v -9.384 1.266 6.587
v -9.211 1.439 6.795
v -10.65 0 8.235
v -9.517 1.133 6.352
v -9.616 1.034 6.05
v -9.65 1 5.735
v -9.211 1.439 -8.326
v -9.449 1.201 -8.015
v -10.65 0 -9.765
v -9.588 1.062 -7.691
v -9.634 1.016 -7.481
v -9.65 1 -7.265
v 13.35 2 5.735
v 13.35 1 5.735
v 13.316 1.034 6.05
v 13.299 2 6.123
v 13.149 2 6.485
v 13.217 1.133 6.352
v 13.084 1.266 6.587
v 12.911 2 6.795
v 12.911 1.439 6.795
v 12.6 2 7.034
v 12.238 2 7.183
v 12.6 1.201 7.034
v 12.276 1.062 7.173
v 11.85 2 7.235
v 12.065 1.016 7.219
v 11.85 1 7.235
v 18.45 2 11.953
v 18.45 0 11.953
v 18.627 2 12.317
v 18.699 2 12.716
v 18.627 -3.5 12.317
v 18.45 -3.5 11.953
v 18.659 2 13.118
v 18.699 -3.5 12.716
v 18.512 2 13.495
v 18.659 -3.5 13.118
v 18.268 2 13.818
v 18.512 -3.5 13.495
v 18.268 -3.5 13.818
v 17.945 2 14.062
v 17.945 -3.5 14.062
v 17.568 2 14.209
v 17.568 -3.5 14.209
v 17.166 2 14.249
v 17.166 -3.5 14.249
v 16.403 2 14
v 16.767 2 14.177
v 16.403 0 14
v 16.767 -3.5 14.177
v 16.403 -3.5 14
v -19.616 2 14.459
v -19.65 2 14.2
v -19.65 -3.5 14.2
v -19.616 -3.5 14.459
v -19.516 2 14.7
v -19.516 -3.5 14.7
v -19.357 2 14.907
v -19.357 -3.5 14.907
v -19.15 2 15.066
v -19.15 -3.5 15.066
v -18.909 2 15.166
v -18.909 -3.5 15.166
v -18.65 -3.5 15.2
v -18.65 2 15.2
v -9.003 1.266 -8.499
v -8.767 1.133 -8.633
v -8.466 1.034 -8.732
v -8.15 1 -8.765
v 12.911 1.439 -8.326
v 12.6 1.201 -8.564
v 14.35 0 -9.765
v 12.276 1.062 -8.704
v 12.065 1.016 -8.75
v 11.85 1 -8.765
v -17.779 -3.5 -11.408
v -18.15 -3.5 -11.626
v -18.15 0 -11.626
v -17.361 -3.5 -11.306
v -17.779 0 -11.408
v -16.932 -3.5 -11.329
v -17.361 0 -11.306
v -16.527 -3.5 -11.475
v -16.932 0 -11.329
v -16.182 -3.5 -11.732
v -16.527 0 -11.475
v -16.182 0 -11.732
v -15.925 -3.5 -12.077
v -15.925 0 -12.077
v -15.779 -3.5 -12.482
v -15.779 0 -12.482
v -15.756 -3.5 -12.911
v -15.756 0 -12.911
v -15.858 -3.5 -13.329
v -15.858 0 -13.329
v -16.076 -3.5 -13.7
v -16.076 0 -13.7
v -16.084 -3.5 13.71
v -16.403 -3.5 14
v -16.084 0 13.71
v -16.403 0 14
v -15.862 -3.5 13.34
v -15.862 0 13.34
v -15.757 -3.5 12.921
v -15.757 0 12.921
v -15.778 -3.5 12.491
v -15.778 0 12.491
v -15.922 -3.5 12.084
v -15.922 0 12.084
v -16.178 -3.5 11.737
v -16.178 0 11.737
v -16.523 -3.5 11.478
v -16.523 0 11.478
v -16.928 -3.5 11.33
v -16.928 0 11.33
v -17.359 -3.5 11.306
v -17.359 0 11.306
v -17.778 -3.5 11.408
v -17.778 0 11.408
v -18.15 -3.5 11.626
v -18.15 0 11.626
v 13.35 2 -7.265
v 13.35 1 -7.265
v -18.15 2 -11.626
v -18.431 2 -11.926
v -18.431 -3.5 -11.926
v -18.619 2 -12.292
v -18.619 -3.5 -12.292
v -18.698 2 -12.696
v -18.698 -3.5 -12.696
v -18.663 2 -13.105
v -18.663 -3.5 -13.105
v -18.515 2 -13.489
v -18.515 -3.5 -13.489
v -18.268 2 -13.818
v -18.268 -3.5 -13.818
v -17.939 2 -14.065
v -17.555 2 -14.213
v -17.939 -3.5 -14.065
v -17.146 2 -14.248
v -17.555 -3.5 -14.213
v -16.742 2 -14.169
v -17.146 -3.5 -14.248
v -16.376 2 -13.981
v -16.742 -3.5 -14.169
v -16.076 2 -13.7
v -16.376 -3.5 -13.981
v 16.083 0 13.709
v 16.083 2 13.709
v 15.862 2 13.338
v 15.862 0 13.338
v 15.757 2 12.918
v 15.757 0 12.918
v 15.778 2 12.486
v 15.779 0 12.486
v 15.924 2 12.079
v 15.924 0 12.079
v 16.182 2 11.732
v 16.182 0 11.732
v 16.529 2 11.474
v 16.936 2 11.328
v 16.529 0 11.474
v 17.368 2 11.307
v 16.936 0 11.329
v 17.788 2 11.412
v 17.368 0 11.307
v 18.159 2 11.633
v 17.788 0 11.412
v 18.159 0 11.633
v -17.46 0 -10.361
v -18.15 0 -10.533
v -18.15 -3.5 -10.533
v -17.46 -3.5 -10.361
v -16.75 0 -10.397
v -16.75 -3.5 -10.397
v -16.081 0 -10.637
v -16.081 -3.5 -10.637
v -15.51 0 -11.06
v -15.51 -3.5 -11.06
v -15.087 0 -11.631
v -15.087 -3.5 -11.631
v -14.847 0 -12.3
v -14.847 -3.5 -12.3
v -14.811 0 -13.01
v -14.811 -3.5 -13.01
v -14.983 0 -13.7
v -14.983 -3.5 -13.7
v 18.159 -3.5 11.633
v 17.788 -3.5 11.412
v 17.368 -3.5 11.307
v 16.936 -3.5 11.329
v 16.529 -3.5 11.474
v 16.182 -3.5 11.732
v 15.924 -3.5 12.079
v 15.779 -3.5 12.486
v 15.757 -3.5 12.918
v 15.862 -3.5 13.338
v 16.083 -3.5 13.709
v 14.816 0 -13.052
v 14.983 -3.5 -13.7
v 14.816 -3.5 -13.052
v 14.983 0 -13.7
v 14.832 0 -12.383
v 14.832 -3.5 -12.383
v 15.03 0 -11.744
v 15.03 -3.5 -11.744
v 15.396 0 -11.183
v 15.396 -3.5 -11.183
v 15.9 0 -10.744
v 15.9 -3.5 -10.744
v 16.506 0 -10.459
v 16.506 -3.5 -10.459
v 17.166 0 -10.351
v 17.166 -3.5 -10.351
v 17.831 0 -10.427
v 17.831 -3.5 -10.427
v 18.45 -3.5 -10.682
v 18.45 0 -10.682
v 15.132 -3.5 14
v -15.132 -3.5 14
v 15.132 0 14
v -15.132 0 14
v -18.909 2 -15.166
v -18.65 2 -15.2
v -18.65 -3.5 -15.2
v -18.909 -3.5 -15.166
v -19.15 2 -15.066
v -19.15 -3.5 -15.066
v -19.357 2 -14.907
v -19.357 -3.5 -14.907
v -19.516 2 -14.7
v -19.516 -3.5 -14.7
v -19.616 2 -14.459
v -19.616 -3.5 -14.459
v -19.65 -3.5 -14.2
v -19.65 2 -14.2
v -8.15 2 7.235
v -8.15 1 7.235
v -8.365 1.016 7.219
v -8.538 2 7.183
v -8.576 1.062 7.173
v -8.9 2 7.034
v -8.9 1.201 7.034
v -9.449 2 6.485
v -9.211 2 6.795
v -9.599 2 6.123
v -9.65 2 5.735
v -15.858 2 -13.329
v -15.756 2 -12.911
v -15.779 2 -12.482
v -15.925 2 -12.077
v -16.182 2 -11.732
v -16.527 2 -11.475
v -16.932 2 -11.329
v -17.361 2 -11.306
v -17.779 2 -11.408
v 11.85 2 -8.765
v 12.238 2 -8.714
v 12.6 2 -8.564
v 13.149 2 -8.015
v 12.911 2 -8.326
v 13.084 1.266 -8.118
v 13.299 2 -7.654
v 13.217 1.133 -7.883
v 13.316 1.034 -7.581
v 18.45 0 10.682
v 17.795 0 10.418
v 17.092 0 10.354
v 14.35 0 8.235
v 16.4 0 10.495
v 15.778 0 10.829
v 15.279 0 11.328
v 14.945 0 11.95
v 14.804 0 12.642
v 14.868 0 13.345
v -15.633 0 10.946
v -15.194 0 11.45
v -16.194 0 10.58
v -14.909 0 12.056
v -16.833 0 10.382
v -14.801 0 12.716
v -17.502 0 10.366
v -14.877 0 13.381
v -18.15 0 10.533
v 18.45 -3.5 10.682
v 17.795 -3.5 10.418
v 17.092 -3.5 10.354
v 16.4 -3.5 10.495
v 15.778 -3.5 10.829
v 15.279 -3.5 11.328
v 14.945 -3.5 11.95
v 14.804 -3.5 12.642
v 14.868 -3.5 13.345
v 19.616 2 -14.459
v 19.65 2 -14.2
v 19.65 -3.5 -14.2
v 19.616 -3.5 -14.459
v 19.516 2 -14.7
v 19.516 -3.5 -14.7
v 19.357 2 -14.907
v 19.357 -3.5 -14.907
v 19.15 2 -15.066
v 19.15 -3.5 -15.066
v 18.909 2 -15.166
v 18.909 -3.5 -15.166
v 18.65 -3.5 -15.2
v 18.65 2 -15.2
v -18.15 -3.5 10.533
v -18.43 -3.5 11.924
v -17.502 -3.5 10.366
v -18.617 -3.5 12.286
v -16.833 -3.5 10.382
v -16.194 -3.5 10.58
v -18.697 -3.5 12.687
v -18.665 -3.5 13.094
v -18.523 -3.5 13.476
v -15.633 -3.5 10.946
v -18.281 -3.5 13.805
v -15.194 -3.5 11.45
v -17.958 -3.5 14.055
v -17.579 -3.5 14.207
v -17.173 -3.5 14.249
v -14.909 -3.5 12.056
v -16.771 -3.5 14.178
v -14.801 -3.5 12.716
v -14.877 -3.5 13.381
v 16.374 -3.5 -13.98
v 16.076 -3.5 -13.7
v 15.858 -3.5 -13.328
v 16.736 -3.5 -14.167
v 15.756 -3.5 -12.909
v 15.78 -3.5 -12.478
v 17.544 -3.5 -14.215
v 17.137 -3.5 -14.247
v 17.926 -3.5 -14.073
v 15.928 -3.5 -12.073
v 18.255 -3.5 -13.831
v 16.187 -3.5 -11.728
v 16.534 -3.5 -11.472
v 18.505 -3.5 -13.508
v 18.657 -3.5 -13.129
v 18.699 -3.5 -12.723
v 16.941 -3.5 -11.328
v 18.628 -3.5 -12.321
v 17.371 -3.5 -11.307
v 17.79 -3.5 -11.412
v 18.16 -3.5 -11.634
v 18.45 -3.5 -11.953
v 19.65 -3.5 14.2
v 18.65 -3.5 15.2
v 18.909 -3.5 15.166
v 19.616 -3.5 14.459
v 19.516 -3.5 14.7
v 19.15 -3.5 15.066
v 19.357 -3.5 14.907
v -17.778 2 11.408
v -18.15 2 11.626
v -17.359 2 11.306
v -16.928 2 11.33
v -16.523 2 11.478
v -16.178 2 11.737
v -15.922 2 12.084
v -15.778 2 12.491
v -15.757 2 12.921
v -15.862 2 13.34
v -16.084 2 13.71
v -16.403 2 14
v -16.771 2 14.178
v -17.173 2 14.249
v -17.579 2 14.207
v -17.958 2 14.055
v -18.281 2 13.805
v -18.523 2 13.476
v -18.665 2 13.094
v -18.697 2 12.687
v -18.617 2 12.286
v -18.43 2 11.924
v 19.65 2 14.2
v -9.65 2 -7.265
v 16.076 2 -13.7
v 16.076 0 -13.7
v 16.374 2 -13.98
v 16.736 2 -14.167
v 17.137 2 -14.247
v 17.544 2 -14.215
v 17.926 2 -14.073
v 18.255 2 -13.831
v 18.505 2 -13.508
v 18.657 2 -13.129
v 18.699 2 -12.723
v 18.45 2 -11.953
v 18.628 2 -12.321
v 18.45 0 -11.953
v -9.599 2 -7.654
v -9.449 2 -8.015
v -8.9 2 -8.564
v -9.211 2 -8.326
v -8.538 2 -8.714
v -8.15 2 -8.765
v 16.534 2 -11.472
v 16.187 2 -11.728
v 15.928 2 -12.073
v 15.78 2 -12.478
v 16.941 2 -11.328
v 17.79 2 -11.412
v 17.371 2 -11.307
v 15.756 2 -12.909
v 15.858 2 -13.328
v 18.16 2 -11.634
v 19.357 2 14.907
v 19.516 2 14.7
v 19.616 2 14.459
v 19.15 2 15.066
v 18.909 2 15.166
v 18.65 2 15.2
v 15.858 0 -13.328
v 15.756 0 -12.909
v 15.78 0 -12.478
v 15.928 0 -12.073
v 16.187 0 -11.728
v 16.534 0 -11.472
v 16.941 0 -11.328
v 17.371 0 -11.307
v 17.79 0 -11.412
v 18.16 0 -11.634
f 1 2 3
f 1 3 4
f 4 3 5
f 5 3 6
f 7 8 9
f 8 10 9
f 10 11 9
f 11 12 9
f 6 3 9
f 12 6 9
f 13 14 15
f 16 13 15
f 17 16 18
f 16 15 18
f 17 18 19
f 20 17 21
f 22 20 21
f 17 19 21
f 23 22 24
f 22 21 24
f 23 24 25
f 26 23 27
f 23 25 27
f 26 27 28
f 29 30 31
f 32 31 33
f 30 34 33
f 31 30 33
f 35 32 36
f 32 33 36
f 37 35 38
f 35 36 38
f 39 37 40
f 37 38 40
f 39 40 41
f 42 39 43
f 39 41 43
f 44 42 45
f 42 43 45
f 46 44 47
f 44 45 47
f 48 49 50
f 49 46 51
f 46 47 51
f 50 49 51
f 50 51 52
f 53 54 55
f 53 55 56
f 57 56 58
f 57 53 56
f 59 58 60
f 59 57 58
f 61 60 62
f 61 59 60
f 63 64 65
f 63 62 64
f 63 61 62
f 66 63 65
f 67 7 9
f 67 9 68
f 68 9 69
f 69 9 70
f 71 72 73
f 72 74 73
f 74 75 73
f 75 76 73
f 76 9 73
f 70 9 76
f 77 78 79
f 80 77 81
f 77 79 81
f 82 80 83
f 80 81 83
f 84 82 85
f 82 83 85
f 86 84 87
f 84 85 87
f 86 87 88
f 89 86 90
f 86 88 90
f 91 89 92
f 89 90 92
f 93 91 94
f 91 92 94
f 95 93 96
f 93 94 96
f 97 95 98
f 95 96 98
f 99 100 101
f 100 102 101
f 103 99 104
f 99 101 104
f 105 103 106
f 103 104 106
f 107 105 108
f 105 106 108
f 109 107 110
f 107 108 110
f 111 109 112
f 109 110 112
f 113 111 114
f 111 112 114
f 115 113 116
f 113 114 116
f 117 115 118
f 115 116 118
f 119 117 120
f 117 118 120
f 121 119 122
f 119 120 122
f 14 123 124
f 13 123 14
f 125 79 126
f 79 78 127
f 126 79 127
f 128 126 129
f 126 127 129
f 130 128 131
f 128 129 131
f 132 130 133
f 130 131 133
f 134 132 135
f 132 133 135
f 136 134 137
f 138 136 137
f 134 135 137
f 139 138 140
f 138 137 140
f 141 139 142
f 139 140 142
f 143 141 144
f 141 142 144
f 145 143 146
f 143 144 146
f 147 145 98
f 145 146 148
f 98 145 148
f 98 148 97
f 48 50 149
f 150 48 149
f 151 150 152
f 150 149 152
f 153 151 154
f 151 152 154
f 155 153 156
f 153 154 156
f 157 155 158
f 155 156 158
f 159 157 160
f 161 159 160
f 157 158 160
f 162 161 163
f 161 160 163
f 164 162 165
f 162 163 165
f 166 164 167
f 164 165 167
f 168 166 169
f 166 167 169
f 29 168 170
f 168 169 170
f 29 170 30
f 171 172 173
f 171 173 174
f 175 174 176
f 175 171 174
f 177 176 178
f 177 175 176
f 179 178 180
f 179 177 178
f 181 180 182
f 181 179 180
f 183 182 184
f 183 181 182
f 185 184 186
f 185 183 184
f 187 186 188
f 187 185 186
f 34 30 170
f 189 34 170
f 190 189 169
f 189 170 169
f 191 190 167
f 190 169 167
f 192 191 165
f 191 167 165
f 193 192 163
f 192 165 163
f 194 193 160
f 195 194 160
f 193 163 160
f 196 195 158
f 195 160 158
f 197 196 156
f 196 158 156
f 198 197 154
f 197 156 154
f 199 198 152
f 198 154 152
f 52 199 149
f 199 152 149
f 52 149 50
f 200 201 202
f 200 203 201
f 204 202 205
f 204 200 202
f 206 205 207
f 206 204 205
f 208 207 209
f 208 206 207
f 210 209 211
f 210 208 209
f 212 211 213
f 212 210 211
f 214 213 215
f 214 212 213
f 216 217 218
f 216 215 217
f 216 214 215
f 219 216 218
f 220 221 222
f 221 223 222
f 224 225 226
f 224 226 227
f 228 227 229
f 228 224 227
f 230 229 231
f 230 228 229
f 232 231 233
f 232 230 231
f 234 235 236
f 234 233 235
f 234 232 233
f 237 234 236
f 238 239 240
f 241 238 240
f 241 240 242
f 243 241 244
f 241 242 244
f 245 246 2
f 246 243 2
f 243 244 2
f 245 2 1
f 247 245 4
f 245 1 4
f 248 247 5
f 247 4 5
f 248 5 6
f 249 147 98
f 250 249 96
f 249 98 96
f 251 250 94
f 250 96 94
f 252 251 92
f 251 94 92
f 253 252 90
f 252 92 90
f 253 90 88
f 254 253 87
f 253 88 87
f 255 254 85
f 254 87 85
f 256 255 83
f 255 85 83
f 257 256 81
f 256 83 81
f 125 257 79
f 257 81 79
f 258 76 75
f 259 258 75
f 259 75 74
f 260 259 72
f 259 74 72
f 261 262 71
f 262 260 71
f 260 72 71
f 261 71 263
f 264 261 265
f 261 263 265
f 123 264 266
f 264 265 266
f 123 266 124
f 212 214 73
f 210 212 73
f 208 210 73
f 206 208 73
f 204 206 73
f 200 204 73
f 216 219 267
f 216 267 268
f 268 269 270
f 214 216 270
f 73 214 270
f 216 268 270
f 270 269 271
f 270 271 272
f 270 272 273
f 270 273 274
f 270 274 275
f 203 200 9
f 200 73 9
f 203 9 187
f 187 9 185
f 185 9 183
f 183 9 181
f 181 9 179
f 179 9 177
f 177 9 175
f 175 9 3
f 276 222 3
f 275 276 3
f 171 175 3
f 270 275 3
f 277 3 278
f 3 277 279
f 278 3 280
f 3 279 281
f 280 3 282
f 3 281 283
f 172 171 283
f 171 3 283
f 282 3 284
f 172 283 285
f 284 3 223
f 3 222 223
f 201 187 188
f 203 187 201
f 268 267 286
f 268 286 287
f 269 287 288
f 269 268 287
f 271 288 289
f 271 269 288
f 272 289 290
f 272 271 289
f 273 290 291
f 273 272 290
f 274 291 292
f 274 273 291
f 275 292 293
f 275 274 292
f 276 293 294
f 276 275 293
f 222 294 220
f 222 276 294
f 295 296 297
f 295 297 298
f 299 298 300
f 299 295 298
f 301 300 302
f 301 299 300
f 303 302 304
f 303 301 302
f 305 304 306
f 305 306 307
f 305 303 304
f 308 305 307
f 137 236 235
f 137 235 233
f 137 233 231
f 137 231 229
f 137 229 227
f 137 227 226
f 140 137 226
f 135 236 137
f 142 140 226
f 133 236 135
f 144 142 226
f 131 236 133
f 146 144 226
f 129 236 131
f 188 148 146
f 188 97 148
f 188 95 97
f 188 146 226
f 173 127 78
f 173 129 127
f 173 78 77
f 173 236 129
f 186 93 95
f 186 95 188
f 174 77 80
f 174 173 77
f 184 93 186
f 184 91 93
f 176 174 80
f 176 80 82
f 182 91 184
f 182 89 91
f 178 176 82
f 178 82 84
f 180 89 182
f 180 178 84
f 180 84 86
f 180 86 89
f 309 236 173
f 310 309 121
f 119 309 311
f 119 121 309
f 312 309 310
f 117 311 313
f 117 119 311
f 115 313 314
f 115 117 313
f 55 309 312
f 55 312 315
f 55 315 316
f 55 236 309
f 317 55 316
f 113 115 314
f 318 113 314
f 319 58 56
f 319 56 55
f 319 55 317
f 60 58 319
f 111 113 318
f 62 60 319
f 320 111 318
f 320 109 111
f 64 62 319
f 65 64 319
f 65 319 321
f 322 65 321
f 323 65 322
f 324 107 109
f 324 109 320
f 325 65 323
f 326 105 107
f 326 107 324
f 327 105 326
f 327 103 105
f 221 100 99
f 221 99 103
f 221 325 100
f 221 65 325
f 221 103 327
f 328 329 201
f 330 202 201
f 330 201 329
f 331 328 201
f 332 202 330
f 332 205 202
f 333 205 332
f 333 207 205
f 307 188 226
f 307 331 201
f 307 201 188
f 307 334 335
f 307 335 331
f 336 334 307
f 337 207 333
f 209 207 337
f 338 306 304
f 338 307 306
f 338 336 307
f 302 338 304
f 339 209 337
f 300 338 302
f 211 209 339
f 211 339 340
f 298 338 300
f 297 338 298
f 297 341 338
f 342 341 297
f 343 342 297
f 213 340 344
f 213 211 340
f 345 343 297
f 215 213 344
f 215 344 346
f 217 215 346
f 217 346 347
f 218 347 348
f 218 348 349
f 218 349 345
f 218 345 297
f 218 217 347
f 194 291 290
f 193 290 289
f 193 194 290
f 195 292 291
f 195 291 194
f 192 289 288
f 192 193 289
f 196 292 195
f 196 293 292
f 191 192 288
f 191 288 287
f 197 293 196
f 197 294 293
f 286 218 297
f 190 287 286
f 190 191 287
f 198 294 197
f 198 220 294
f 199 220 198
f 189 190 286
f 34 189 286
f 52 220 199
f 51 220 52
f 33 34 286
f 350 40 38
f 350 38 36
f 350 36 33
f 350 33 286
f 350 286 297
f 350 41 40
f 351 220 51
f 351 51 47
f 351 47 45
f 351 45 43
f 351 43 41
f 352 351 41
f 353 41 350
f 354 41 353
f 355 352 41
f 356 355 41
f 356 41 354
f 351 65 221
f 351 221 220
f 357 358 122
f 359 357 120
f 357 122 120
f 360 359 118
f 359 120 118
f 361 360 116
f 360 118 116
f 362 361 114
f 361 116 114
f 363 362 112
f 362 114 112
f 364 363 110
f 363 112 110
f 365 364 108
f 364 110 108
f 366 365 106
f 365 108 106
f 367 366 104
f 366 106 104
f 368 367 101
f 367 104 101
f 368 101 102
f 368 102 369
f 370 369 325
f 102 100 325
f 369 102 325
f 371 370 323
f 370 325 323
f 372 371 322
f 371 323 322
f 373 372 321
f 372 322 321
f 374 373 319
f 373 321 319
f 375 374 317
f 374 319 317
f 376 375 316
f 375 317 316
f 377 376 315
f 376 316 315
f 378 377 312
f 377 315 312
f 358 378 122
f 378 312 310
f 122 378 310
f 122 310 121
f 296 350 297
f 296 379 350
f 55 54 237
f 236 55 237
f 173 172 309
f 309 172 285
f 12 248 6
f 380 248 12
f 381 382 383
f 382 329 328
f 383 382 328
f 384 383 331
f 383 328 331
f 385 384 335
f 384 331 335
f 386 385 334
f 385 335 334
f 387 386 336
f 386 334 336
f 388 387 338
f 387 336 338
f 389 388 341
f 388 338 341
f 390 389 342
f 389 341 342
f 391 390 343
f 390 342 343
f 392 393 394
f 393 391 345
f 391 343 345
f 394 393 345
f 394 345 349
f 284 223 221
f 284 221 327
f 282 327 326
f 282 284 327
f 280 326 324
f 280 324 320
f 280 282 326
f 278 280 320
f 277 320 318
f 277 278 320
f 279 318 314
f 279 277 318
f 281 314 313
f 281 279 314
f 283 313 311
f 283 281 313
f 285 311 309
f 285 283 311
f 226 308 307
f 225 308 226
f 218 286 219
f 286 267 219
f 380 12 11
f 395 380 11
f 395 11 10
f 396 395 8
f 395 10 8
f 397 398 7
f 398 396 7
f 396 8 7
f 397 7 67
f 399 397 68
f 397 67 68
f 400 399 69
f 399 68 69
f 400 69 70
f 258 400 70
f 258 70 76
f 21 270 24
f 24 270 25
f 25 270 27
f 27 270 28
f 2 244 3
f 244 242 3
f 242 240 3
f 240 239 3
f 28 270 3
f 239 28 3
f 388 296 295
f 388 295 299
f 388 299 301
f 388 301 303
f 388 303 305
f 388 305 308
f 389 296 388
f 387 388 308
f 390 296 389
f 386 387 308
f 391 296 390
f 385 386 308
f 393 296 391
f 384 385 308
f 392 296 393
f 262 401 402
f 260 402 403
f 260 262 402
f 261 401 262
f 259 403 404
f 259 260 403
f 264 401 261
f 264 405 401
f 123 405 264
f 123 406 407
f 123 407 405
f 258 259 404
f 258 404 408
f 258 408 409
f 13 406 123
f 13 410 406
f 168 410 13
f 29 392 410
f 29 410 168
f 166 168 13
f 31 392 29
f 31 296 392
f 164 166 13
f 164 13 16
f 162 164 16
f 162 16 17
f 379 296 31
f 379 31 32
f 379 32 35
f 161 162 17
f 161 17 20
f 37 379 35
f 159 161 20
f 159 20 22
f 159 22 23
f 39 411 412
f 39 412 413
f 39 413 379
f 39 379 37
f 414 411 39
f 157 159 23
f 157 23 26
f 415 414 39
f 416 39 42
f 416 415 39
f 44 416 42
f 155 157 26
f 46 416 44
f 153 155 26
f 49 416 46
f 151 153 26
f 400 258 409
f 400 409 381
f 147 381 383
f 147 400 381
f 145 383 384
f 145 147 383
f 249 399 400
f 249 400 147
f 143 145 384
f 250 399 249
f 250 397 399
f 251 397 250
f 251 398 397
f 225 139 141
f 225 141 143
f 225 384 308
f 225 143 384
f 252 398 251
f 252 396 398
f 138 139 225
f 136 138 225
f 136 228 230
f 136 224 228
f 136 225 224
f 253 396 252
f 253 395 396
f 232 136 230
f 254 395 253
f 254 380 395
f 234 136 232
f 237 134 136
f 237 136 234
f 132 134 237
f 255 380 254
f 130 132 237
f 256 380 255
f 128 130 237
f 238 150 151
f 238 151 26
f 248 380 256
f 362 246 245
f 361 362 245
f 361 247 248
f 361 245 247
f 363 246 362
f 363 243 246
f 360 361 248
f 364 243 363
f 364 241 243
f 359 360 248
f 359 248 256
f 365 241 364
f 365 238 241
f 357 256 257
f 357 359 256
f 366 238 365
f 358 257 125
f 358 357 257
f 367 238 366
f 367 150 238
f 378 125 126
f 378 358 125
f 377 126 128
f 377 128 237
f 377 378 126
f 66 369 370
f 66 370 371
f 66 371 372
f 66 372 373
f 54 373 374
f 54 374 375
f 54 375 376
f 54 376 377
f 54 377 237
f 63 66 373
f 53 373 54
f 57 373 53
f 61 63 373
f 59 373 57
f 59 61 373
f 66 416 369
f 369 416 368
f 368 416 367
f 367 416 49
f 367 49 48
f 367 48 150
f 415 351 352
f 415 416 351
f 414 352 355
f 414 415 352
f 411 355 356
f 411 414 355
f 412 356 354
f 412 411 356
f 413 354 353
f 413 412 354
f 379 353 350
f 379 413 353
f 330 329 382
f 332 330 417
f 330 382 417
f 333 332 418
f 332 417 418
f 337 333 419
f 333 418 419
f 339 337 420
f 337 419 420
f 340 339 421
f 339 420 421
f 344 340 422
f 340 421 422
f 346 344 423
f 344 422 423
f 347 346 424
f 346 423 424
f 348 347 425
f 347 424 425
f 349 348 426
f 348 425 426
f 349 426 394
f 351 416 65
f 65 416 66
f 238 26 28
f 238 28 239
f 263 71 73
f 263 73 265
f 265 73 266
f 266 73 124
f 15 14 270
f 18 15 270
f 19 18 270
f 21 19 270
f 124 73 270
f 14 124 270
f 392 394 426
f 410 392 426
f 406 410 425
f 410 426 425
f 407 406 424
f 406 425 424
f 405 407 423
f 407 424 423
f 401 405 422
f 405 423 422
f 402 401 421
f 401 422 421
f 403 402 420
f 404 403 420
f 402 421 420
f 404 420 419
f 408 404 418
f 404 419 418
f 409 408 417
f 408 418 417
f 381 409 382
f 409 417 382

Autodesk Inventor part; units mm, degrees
ref_plane "YZ Plane" through (0, 0, 0) normal (1, 0, 0) x (0, 1, 0)
ref_plane "XZ Plane" through (0, 0, 0) normal (0, 1, 0) x (-1, 0, 0)
ref_plane "XY Plane" through (0, 0, 0) normal (0, 0, 1) x (1, 0, 0)
sketch "Sketch1" plane through (0, 0, 0) normal (0, 1, 0) x (-1, 0, 0)
  line L0 (-19.65, 15.2) -> (19.65, 15.2)
  line L1 (19.65, 15.2) -> (19.65, -15.2)
  line L2 (19.65, -15.2) -> (-19.65, -15.2)
  line L3 (-19.65, -15.2) -> (-19.65, 15.2)
  line L4 (-19.65, 15.2) -> (19.65, -15.2) construction
  line L5 (19.65, 15.2) -> (-19.65, -15.2) construction
  point P0 (0, 0)
  dimension "d0" = 30.4
  dimension "d1" = 39.3
extrude "Extrusion1" add sketch "Sketch1" along normal blind 2
sketch "Sketch2" plane through (0, 0, 0) normal (0, -1, 0) x (1, 0, 0)
  circle A0 centre (-17.225, -12.775) radius 2.425
  circle A1 centre (-17.225, -12.775) radius 1.475
  line L0 (-19.65, -15.2) -> (19.65, -15.2) projected
  line L1 (-19.65, 15.2) -> (-19.65, -15.2) projected
  circle A2 centre (-17.225, 12.775) radius 1.475
  circle A3 centre (-17.225, 12.775) radius 2.425
  circle A4 centre (17.225, 12.775) radius 1.475
  circle A5 centre (17.225, 12.775) radius 2.425
  circle A6 centre (17.225, -12.775) radius 1.475
  circle A7 centre (17.225, -12.775) radius 2.425
  line L2 (19.65, 15.2) -> (-19.65, 15.2) projected
  line L3 (19.65, -15.2) -> (19.65, 15.2) projected
  point P0 (0, 0)
  dimension "d4" = 0.95
  dimension "d5" = 2.95
  dimension "d6" = 2.95
  dimension "d7" = 0.95
  dimension "d8" = 2.95
  dimension "d9" = 0.95
  dimension "d10" = 2.95
  dimension "d11" = 0.95
  dimension "d12" = 39.3
extrude "Extrusion3" add sketch "Sketch2" along normal blind 3.5 contours A0 | A3 | A7 | A5
sketch "Sketch3" plane through (0, 0, 0) normal (0, -1, 0) x (1, 0, 0)
  line L0 (-19.65, -15.2) -> (-17.225, -15.2) projected
  circle A0 centre (-17.225, 12.775) radius 2.425 projected
  line L1 (-19.65, -15.2) -> (-18.15, -15.2)
  line L2 (-18.15, -15.2) -> (-18.15, 15.0167)
  line L3 (-18.15, 15.0167) -> (-19.65, 15.0167)
  line L4 (-19.65, 15.0167) -> (-19.65, -15.2)
  point P0 (0, 0)
  dimension "d17" = 1.5
extrude "Extrusion4" add sketch "Sketch3" along normal up to surface (3.5 mm away) contours L4 A0 L2 L0 | L4 L3 A0 | A0 L2 picked at (-18.7278, 13.0496)
sketch "Sketch4" plane through (0, 0, 0) normal (0, -1, 0) x (1, 0, 0)
  line L0 (19.65, -15.2) -> (-19.65, -15.2) projected
  line L1 (-19.65, -15.2) -> (-19.65, 15.2) projected
  line L2 (19.65, -15.2) -> (-19.65, -15.2)
  line L3 (-19.65, -15.2) -> (-19.65, -13.7)
  line L4 (-19.65, -13.7) -> (19.65, -13.7)
  line L5 (19.65, -13.7) -> (19.65, -15.2)
  point P0 (0, 0)
  dimension "d20" = 1.5
extrude "Extrusion5" add sketch "Sketch4" along normal up to surface (3.5 mm away)
sketch "Sketch5" plane through (0, 0, 0) normal (0, -1, 0) x (1, 0, 0)
  line L0 (-19.65, 15.0167) -> (-19.65, -15.2) projected
  line L1 (19.65, 15.2) -> (-19.65, 15.2)
  line L2 (-19.65, 15.2) -> (-19.65, 14)
  line L3 (-19.65, 14) -> (19.65, 14)
  line L4 (19.65, 14) -> (19.65, 15.2)
  point P0 (0, 0)
  dimension "d23" = 1.2
extrude "Extrusion6" add sketch "Sketch5" along normal up to surface (3.5 mm away)
sketch "Sketch6" plane through (0, 0, 0) normal (0, -1, 0) x (1, 0, 0)
  line L0 (-19.65, 15.2) -> (19.65, 15.2) projected
  line L1 (19.65, -15.2) -> (-19.65, -15.2) projected
  line L2 (19.65, 15.2) -> (18.45, 15.2)
  line L3 (18.45, 15.2) -> (18.45, -15.2)
  line L4 (18.45, -15.2) -> (19.65, -15.2)
  line L5 (19.65, -15.2) -> (19.65, 15.2)
  dimension "d27" = 1.2
extrude "Extrusion7" add sketch "Sketch6" along normal up to surface (3.5 mm away)
sketch "Sketch7" plane through (0, -3.5, 0) normal (0, -1, 0) x (1, 0, 0)
  arc A0 (16.4034, 14) -> (18.45, 11.9534) centre (17.225, 12.775) ccw projected
  circle A1 centre (17.225, 12.775) radius 1.475
  arc A2 (18.45, -11.9534) -> (16.0761, -13.7) centre (17.225, -12.775) ccw projected
  circle A3 centre (17.225, -12.775) radius 1.475
  arc A4 (-16.0761, -13.7) -> (-18.15, -11.6261) centre (-17.225, -12.775) ccw projected
  circle A5 centre (-17.225, -12.775) radius 1.475
  arc A6 (-18.15, 11.6261) -> (-16.4034, 14) centre (-17.225, 12.775) ccw projected
  circle A7 centre (-17.225, 12.775) radius 1.475
  point P0 (0, 0)
extrude "Extrusion8" cut sketch "Sketch7" against normal up to surface (5.5 mm away)
sketch "Sketch8" plane through (0, 2, 0) normal (0, 1, 0) x (1, 0, 0)
  line L0 (13.35, -7.2346) -> (-9.65, -7.2346)
  line L1 (-9.65, -7.2346) -> (-9.65, 8.7654)
  line L2 (-9.65, 8.7654) -> (13.35, 8.7654)
  line L3 (13.35, 8.7654) -> (13.35, -7.2346)
  line L4 (13.35, -7.2346) -> (-9.65, 8.7654) construction
  line L5 (-9.65, -7.2346) -> (13.35, 8.7654) construction
  line L6 (-19.65, 15.2) -> (-19.65, -15.2) projected
  point P0 (0, 0)
  point P1 (1.85, 0.7654)
  dimension "d34" = 23
  dimension "d35" = 10
  dimension "d40" = 16
extrude "Extrusion9" cut sketch "Sketch8" against normal up to surface (2 mm away)
chamfer "Chamfer1" distance 1 angle 45 4 edges at (-9.65, 0, -0.7654) (1.85, 0, 7.2346) (13.35, 0, -0.7654) (1.85, 0, -8.7654)
fillet "Fillet2" radius 1 4 edges at (-19.65, -0.75, 15.2) (19.65, -0.75, 15.2) (19.65, -0.75, -15.2) (-19.65, -0.75, -15.2)
fillet "Fillet3" radius 1.5 4 edges at (13.35, 1.5, -8.7654) (-9.65, 1.5, -8.7654) (-9.65, 1.5, 7.2346) (13.35, 1.5, 7.2346)
properties part number "Enclosure_Lid"
